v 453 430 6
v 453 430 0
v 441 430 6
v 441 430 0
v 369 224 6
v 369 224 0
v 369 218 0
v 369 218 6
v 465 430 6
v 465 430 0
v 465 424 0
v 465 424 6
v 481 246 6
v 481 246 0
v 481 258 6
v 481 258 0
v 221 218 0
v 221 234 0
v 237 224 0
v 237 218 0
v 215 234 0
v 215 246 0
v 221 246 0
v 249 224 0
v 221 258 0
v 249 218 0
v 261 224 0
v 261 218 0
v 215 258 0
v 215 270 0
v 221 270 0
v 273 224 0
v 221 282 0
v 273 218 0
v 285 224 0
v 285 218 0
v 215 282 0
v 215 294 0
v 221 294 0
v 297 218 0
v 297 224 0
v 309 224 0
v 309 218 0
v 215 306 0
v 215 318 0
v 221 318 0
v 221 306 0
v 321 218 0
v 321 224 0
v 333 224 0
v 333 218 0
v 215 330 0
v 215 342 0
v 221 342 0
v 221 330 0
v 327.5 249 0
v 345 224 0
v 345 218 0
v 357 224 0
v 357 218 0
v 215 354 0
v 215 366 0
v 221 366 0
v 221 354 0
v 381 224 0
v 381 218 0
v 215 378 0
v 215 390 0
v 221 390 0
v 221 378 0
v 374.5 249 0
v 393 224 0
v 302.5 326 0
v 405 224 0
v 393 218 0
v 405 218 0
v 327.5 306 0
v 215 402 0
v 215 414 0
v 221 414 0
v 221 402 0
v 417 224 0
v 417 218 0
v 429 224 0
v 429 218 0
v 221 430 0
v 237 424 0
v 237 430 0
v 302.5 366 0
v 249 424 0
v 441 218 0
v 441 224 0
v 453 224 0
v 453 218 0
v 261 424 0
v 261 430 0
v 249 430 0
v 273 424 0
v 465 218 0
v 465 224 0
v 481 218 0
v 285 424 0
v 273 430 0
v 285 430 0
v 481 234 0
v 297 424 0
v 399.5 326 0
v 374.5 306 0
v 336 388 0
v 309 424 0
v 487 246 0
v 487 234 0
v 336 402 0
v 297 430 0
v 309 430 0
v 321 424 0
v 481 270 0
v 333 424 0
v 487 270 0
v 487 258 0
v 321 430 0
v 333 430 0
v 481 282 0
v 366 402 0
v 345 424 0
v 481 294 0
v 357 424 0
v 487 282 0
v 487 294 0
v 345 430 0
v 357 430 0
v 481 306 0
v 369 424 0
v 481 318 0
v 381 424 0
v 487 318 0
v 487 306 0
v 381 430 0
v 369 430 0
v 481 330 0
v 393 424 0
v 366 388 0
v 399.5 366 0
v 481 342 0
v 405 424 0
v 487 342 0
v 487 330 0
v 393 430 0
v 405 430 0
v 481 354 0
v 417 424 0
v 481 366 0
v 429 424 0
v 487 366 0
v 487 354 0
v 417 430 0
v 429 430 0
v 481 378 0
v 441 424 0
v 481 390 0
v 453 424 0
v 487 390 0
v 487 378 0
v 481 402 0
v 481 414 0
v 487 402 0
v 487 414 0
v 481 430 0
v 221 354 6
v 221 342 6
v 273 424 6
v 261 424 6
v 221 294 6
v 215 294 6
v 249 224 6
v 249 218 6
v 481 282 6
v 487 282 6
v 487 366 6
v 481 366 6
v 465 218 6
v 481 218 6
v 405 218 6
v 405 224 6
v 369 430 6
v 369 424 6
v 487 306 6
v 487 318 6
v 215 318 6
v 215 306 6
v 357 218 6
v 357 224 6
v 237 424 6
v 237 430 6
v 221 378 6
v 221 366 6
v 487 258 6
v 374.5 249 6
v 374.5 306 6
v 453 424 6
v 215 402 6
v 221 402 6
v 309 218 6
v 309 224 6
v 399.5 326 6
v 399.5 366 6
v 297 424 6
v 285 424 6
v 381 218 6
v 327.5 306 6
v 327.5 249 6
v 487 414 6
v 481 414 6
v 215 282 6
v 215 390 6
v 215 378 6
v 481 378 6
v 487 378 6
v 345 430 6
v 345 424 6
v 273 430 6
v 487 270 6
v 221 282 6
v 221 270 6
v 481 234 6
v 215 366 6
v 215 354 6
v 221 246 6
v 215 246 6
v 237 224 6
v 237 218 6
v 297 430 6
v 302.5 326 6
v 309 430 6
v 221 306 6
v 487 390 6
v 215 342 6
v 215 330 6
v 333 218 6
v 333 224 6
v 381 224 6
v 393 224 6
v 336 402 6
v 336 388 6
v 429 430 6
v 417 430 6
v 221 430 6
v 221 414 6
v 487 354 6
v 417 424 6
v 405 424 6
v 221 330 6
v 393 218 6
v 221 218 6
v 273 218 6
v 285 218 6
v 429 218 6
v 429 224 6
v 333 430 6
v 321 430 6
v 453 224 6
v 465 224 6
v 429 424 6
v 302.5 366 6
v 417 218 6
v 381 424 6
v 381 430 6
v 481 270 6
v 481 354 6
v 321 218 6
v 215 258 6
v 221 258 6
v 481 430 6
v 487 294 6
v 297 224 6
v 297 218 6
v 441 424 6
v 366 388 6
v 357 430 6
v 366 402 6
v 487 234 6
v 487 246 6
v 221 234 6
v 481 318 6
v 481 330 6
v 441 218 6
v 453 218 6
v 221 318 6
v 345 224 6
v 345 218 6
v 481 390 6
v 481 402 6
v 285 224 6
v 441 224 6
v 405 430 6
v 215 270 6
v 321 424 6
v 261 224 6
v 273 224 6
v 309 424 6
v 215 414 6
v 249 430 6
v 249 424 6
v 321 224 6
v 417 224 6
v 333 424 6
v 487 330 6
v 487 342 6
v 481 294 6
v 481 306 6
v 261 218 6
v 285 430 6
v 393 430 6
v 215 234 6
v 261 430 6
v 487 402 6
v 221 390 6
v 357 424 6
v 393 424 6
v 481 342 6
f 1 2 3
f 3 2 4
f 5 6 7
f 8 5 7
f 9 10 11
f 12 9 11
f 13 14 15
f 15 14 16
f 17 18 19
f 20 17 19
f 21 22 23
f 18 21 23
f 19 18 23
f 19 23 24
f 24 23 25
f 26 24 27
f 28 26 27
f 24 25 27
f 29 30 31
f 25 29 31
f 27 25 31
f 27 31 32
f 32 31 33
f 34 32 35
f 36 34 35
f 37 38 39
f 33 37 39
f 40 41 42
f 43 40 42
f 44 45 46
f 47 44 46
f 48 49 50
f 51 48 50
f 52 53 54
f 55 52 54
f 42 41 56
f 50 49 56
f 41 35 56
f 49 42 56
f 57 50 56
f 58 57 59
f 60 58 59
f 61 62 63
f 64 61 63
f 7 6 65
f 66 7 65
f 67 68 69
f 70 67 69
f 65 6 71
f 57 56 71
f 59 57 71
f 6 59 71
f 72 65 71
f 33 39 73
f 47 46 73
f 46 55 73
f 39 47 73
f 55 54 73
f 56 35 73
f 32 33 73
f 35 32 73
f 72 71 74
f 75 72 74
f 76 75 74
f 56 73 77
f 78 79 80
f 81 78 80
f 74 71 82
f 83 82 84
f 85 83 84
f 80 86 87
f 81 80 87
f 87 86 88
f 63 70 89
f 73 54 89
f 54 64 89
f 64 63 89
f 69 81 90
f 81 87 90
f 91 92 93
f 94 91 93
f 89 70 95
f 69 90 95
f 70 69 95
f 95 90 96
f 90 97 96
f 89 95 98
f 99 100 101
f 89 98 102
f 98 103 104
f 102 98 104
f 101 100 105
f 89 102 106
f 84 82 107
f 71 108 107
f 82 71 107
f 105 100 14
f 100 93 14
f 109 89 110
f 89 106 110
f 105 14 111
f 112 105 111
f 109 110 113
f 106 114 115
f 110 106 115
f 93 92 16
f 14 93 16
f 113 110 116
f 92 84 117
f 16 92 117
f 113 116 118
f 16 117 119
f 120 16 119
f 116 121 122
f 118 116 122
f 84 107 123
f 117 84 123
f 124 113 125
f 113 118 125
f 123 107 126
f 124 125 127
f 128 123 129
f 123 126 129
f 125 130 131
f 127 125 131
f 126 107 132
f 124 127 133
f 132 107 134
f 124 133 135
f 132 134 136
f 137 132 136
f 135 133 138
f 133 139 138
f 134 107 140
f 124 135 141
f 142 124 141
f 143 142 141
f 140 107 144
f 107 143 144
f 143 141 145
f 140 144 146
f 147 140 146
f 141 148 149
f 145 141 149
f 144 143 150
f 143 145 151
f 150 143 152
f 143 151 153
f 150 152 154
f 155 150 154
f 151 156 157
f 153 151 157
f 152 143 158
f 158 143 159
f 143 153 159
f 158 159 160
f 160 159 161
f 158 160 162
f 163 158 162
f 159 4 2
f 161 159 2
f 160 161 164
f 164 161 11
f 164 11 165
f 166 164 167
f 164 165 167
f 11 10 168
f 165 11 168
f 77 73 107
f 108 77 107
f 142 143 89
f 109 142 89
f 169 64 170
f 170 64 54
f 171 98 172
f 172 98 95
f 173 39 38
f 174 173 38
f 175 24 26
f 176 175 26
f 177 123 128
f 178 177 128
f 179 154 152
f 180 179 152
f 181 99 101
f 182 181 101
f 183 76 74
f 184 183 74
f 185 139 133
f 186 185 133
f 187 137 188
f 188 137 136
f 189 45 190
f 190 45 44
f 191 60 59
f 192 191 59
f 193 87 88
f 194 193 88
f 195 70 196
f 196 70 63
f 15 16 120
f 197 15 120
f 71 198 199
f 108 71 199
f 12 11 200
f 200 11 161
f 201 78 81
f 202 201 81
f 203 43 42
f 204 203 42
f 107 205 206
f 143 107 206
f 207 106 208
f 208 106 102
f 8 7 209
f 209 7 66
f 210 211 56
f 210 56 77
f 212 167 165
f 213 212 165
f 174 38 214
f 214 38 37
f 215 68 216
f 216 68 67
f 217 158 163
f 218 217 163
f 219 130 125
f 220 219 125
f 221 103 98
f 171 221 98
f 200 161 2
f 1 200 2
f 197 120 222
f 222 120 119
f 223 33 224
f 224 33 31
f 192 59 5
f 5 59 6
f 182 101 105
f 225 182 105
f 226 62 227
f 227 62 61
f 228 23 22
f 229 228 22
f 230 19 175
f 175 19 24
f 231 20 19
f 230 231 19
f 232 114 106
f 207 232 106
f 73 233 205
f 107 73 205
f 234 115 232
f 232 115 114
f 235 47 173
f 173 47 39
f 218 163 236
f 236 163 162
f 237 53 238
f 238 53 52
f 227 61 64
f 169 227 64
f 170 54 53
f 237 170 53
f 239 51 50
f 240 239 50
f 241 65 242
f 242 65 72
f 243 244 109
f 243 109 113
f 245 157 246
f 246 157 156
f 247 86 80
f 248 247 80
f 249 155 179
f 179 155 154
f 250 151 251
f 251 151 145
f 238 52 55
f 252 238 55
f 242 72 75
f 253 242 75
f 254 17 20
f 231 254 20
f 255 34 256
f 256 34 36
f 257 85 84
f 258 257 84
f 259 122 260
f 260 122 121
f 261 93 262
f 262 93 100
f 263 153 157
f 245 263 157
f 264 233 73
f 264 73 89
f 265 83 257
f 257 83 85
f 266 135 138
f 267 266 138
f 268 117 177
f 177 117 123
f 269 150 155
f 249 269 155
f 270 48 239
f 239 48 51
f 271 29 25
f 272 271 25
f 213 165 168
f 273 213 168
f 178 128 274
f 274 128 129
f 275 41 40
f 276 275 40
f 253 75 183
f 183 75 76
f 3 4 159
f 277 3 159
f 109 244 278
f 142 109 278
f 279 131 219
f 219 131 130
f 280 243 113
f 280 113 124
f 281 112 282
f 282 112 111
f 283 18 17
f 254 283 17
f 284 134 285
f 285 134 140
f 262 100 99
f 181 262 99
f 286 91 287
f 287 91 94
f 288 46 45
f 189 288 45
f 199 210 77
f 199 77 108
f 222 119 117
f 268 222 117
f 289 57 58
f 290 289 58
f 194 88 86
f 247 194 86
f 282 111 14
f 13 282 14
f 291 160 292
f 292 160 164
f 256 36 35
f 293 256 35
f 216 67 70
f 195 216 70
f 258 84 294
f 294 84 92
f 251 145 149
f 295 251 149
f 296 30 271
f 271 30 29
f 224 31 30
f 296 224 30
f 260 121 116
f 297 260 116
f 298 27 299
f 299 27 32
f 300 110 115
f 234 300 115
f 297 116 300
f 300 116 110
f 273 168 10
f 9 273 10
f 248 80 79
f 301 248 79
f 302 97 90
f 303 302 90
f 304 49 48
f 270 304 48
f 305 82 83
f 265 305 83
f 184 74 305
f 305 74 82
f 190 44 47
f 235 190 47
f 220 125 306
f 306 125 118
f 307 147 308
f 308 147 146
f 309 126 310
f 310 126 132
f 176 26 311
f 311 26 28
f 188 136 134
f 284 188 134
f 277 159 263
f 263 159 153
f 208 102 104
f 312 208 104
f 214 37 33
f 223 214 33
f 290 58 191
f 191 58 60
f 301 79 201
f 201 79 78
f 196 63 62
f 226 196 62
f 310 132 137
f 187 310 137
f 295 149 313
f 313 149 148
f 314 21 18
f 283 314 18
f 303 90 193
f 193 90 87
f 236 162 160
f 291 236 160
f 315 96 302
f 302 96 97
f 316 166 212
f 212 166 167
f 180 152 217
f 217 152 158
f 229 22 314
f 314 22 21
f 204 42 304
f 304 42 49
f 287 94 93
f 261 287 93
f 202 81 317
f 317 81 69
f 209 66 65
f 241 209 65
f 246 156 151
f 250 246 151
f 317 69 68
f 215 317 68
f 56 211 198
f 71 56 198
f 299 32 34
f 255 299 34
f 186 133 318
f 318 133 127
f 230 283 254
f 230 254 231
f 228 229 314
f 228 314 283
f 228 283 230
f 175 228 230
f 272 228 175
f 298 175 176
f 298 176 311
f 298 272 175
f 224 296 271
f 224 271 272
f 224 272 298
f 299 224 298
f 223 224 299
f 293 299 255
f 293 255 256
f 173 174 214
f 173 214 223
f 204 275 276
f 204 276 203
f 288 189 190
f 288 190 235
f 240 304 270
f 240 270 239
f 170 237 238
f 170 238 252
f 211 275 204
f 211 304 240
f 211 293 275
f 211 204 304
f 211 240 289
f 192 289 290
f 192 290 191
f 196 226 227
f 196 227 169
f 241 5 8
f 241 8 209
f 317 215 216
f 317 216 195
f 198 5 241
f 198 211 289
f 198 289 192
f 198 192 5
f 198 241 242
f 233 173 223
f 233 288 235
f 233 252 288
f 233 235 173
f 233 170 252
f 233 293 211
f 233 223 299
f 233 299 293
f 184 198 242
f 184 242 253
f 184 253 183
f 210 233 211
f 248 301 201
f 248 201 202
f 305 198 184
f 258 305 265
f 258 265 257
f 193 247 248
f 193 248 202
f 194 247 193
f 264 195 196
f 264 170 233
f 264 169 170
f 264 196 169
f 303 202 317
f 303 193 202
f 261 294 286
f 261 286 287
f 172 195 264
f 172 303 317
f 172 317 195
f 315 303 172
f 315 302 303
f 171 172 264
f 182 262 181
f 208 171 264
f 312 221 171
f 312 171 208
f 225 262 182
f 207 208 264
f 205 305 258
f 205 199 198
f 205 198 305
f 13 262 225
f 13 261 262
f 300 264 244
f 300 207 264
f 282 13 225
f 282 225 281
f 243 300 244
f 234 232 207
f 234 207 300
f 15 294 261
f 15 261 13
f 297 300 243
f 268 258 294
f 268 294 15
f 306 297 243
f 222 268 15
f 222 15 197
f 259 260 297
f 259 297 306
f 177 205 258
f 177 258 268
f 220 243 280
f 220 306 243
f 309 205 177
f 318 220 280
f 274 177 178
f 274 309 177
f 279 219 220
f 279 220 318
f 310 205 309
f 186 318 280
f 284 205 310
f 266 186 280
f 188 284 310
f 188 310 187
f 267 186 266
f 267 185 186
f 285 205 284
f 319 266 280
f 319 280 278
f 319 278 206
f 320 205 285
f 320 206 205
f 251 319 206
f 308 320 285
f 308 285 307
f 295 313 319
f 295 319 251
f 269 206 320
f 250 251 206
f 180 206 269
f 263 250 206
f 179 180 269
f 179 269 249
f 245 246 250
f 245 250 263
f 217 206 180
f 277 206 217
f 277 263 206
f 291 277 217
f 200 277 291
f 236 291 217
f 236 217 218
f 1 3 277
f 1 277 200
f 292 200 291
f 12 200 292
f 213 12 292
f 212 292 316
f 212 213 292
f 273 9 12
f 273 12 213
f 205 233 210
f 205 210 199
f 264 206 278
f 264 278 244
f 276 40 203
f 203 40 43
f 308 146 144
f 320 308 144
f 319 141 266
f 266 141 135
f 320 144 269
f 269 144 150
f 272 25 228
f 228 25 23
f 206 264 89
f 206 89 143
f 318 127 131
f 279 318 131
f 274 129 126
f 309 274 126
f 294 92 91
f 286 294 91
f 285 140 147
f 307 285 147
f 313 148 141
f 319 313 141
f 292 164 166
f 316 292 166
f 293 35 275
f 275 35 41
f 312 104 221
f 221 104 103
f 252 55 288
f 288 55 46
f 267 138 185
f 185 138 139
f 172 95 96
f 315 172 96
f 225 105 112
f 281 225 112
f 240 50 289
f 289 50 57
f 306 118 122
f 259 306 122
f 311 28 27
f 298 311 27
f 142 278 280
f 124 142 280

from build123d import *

# Parameters (mm, degrees)
BOSS_EXTRUDE1_DEPTH = 6
SKETCH2_W           = 30
SKETCH2_H           = 14
SKETCH2_W_2         = 97
SKETCH2_H_2         = 40
SKETCH2_W_3         = 47
SKETCH2_H_3         = 57
CUT_EXTRUDE1_DEPTH  = 6


with BuildPart() as part:
    # Model → Boss-Extrude1 (new body)
    with BuildSketch(Plane.XY):
        Polygon((221, 430), (221, 414), (215, 414), (215, 402), (221, 402), (221, 390), (215, 390), (215, 378), (221, 378), (221, 366), (215, 366), (215, 354), (221, 354), (221, 342), (215, 342), (215, 330), (221, 330), (221, 318), (215, 318), (215, 306), (221, 306), (221, 294), (215, 294), (215, 282), (221, 282), (221, 270), (215, 270), (215, 258), (221, 258), (221, 246), (215, 246), (215, 234), (221, 234), (221, 218), (237, 218), (237, 224), (249, 224), (249, 218), (261, 218), (261, 224), (273, 224), (273, 218), (285, 218), (285, 224), (297, 224), (297, 218), (309, 218), (309, 224), (321, 224), (321, 218), (333, 218), (333, 224), (345, 224), (345, 218), (357, 218), (357, 224), (369, 224), (369, 218), (381, 218), (381, 224), (393, 224), (393, 218), (405, 218), (405, 224), (417, 224), (417, 218), (429, 218), (429, 224), (441, 224), (441, 218), (453, 218), (453, 224), (465, 224), (465, 218), (477, 218), (481, 218), (481, 234), (487, 234), (487, 246), (481, 246), (481, 258), (487, 258), (487, 270), (481, 270), (481, 282), (487, 282), (487, 294), (481, 294), (481, 306), (487, 306), (487, 318), (481, 318), (481, 330), (487, 330), (487, 342), (481, 342), (481, 354), (487, 354), (487, 366), (481, 366), (481, 378), (487, 378), (487, 390), (481, 390), (481, 402), (487, 402), (487, 414), (481, 414), (481, 430), (465, 430), (465, 424), (453, 424), (453, 430), (441, 430), (441, 424), (429, 424), (429, 430), (417, 430), (417, 424), (405, 424), (405, 430), (393, 430), (393, 424), (381, 424), (381, 430), (369, 430), (369, 424), (357, 424), (357, 430), (345, 430), (345, 424), (333, 424), (333, 430), (321, 430), (321, 424), (309, 424), (309, 430), (297, 430), (297, 424), (285, 424), (285, 430), (273, 430), (273, 424), (261, 424), (261, 430), (249, 430), (249, 424), (237, 424), (237, 430), (225, 430), align=None)
    extrude(amount=BOSS_EXTRUDE1_DEPTH)

    # Sketch2 → Cut-Extrude1 (cut)
    with BuildSketch(Plane.XY.offset(6)):
        with Locations((351, 395)):
            Rectangle(SKETCH2_W, SKETCH2_H)
        with Locations((351, 346)):
            Rectangle(SKETCH2_W_2, SKETCH2_H_2)
        with Locations((351, 277.5)):
            Rectangle(SKETCH2_W_3, SKETCH2_H_3)
    extrude(amount=-CUT_EXTRUDE1_DEPTH, mode=Mode.SUBTRACT)


solid = part.part
